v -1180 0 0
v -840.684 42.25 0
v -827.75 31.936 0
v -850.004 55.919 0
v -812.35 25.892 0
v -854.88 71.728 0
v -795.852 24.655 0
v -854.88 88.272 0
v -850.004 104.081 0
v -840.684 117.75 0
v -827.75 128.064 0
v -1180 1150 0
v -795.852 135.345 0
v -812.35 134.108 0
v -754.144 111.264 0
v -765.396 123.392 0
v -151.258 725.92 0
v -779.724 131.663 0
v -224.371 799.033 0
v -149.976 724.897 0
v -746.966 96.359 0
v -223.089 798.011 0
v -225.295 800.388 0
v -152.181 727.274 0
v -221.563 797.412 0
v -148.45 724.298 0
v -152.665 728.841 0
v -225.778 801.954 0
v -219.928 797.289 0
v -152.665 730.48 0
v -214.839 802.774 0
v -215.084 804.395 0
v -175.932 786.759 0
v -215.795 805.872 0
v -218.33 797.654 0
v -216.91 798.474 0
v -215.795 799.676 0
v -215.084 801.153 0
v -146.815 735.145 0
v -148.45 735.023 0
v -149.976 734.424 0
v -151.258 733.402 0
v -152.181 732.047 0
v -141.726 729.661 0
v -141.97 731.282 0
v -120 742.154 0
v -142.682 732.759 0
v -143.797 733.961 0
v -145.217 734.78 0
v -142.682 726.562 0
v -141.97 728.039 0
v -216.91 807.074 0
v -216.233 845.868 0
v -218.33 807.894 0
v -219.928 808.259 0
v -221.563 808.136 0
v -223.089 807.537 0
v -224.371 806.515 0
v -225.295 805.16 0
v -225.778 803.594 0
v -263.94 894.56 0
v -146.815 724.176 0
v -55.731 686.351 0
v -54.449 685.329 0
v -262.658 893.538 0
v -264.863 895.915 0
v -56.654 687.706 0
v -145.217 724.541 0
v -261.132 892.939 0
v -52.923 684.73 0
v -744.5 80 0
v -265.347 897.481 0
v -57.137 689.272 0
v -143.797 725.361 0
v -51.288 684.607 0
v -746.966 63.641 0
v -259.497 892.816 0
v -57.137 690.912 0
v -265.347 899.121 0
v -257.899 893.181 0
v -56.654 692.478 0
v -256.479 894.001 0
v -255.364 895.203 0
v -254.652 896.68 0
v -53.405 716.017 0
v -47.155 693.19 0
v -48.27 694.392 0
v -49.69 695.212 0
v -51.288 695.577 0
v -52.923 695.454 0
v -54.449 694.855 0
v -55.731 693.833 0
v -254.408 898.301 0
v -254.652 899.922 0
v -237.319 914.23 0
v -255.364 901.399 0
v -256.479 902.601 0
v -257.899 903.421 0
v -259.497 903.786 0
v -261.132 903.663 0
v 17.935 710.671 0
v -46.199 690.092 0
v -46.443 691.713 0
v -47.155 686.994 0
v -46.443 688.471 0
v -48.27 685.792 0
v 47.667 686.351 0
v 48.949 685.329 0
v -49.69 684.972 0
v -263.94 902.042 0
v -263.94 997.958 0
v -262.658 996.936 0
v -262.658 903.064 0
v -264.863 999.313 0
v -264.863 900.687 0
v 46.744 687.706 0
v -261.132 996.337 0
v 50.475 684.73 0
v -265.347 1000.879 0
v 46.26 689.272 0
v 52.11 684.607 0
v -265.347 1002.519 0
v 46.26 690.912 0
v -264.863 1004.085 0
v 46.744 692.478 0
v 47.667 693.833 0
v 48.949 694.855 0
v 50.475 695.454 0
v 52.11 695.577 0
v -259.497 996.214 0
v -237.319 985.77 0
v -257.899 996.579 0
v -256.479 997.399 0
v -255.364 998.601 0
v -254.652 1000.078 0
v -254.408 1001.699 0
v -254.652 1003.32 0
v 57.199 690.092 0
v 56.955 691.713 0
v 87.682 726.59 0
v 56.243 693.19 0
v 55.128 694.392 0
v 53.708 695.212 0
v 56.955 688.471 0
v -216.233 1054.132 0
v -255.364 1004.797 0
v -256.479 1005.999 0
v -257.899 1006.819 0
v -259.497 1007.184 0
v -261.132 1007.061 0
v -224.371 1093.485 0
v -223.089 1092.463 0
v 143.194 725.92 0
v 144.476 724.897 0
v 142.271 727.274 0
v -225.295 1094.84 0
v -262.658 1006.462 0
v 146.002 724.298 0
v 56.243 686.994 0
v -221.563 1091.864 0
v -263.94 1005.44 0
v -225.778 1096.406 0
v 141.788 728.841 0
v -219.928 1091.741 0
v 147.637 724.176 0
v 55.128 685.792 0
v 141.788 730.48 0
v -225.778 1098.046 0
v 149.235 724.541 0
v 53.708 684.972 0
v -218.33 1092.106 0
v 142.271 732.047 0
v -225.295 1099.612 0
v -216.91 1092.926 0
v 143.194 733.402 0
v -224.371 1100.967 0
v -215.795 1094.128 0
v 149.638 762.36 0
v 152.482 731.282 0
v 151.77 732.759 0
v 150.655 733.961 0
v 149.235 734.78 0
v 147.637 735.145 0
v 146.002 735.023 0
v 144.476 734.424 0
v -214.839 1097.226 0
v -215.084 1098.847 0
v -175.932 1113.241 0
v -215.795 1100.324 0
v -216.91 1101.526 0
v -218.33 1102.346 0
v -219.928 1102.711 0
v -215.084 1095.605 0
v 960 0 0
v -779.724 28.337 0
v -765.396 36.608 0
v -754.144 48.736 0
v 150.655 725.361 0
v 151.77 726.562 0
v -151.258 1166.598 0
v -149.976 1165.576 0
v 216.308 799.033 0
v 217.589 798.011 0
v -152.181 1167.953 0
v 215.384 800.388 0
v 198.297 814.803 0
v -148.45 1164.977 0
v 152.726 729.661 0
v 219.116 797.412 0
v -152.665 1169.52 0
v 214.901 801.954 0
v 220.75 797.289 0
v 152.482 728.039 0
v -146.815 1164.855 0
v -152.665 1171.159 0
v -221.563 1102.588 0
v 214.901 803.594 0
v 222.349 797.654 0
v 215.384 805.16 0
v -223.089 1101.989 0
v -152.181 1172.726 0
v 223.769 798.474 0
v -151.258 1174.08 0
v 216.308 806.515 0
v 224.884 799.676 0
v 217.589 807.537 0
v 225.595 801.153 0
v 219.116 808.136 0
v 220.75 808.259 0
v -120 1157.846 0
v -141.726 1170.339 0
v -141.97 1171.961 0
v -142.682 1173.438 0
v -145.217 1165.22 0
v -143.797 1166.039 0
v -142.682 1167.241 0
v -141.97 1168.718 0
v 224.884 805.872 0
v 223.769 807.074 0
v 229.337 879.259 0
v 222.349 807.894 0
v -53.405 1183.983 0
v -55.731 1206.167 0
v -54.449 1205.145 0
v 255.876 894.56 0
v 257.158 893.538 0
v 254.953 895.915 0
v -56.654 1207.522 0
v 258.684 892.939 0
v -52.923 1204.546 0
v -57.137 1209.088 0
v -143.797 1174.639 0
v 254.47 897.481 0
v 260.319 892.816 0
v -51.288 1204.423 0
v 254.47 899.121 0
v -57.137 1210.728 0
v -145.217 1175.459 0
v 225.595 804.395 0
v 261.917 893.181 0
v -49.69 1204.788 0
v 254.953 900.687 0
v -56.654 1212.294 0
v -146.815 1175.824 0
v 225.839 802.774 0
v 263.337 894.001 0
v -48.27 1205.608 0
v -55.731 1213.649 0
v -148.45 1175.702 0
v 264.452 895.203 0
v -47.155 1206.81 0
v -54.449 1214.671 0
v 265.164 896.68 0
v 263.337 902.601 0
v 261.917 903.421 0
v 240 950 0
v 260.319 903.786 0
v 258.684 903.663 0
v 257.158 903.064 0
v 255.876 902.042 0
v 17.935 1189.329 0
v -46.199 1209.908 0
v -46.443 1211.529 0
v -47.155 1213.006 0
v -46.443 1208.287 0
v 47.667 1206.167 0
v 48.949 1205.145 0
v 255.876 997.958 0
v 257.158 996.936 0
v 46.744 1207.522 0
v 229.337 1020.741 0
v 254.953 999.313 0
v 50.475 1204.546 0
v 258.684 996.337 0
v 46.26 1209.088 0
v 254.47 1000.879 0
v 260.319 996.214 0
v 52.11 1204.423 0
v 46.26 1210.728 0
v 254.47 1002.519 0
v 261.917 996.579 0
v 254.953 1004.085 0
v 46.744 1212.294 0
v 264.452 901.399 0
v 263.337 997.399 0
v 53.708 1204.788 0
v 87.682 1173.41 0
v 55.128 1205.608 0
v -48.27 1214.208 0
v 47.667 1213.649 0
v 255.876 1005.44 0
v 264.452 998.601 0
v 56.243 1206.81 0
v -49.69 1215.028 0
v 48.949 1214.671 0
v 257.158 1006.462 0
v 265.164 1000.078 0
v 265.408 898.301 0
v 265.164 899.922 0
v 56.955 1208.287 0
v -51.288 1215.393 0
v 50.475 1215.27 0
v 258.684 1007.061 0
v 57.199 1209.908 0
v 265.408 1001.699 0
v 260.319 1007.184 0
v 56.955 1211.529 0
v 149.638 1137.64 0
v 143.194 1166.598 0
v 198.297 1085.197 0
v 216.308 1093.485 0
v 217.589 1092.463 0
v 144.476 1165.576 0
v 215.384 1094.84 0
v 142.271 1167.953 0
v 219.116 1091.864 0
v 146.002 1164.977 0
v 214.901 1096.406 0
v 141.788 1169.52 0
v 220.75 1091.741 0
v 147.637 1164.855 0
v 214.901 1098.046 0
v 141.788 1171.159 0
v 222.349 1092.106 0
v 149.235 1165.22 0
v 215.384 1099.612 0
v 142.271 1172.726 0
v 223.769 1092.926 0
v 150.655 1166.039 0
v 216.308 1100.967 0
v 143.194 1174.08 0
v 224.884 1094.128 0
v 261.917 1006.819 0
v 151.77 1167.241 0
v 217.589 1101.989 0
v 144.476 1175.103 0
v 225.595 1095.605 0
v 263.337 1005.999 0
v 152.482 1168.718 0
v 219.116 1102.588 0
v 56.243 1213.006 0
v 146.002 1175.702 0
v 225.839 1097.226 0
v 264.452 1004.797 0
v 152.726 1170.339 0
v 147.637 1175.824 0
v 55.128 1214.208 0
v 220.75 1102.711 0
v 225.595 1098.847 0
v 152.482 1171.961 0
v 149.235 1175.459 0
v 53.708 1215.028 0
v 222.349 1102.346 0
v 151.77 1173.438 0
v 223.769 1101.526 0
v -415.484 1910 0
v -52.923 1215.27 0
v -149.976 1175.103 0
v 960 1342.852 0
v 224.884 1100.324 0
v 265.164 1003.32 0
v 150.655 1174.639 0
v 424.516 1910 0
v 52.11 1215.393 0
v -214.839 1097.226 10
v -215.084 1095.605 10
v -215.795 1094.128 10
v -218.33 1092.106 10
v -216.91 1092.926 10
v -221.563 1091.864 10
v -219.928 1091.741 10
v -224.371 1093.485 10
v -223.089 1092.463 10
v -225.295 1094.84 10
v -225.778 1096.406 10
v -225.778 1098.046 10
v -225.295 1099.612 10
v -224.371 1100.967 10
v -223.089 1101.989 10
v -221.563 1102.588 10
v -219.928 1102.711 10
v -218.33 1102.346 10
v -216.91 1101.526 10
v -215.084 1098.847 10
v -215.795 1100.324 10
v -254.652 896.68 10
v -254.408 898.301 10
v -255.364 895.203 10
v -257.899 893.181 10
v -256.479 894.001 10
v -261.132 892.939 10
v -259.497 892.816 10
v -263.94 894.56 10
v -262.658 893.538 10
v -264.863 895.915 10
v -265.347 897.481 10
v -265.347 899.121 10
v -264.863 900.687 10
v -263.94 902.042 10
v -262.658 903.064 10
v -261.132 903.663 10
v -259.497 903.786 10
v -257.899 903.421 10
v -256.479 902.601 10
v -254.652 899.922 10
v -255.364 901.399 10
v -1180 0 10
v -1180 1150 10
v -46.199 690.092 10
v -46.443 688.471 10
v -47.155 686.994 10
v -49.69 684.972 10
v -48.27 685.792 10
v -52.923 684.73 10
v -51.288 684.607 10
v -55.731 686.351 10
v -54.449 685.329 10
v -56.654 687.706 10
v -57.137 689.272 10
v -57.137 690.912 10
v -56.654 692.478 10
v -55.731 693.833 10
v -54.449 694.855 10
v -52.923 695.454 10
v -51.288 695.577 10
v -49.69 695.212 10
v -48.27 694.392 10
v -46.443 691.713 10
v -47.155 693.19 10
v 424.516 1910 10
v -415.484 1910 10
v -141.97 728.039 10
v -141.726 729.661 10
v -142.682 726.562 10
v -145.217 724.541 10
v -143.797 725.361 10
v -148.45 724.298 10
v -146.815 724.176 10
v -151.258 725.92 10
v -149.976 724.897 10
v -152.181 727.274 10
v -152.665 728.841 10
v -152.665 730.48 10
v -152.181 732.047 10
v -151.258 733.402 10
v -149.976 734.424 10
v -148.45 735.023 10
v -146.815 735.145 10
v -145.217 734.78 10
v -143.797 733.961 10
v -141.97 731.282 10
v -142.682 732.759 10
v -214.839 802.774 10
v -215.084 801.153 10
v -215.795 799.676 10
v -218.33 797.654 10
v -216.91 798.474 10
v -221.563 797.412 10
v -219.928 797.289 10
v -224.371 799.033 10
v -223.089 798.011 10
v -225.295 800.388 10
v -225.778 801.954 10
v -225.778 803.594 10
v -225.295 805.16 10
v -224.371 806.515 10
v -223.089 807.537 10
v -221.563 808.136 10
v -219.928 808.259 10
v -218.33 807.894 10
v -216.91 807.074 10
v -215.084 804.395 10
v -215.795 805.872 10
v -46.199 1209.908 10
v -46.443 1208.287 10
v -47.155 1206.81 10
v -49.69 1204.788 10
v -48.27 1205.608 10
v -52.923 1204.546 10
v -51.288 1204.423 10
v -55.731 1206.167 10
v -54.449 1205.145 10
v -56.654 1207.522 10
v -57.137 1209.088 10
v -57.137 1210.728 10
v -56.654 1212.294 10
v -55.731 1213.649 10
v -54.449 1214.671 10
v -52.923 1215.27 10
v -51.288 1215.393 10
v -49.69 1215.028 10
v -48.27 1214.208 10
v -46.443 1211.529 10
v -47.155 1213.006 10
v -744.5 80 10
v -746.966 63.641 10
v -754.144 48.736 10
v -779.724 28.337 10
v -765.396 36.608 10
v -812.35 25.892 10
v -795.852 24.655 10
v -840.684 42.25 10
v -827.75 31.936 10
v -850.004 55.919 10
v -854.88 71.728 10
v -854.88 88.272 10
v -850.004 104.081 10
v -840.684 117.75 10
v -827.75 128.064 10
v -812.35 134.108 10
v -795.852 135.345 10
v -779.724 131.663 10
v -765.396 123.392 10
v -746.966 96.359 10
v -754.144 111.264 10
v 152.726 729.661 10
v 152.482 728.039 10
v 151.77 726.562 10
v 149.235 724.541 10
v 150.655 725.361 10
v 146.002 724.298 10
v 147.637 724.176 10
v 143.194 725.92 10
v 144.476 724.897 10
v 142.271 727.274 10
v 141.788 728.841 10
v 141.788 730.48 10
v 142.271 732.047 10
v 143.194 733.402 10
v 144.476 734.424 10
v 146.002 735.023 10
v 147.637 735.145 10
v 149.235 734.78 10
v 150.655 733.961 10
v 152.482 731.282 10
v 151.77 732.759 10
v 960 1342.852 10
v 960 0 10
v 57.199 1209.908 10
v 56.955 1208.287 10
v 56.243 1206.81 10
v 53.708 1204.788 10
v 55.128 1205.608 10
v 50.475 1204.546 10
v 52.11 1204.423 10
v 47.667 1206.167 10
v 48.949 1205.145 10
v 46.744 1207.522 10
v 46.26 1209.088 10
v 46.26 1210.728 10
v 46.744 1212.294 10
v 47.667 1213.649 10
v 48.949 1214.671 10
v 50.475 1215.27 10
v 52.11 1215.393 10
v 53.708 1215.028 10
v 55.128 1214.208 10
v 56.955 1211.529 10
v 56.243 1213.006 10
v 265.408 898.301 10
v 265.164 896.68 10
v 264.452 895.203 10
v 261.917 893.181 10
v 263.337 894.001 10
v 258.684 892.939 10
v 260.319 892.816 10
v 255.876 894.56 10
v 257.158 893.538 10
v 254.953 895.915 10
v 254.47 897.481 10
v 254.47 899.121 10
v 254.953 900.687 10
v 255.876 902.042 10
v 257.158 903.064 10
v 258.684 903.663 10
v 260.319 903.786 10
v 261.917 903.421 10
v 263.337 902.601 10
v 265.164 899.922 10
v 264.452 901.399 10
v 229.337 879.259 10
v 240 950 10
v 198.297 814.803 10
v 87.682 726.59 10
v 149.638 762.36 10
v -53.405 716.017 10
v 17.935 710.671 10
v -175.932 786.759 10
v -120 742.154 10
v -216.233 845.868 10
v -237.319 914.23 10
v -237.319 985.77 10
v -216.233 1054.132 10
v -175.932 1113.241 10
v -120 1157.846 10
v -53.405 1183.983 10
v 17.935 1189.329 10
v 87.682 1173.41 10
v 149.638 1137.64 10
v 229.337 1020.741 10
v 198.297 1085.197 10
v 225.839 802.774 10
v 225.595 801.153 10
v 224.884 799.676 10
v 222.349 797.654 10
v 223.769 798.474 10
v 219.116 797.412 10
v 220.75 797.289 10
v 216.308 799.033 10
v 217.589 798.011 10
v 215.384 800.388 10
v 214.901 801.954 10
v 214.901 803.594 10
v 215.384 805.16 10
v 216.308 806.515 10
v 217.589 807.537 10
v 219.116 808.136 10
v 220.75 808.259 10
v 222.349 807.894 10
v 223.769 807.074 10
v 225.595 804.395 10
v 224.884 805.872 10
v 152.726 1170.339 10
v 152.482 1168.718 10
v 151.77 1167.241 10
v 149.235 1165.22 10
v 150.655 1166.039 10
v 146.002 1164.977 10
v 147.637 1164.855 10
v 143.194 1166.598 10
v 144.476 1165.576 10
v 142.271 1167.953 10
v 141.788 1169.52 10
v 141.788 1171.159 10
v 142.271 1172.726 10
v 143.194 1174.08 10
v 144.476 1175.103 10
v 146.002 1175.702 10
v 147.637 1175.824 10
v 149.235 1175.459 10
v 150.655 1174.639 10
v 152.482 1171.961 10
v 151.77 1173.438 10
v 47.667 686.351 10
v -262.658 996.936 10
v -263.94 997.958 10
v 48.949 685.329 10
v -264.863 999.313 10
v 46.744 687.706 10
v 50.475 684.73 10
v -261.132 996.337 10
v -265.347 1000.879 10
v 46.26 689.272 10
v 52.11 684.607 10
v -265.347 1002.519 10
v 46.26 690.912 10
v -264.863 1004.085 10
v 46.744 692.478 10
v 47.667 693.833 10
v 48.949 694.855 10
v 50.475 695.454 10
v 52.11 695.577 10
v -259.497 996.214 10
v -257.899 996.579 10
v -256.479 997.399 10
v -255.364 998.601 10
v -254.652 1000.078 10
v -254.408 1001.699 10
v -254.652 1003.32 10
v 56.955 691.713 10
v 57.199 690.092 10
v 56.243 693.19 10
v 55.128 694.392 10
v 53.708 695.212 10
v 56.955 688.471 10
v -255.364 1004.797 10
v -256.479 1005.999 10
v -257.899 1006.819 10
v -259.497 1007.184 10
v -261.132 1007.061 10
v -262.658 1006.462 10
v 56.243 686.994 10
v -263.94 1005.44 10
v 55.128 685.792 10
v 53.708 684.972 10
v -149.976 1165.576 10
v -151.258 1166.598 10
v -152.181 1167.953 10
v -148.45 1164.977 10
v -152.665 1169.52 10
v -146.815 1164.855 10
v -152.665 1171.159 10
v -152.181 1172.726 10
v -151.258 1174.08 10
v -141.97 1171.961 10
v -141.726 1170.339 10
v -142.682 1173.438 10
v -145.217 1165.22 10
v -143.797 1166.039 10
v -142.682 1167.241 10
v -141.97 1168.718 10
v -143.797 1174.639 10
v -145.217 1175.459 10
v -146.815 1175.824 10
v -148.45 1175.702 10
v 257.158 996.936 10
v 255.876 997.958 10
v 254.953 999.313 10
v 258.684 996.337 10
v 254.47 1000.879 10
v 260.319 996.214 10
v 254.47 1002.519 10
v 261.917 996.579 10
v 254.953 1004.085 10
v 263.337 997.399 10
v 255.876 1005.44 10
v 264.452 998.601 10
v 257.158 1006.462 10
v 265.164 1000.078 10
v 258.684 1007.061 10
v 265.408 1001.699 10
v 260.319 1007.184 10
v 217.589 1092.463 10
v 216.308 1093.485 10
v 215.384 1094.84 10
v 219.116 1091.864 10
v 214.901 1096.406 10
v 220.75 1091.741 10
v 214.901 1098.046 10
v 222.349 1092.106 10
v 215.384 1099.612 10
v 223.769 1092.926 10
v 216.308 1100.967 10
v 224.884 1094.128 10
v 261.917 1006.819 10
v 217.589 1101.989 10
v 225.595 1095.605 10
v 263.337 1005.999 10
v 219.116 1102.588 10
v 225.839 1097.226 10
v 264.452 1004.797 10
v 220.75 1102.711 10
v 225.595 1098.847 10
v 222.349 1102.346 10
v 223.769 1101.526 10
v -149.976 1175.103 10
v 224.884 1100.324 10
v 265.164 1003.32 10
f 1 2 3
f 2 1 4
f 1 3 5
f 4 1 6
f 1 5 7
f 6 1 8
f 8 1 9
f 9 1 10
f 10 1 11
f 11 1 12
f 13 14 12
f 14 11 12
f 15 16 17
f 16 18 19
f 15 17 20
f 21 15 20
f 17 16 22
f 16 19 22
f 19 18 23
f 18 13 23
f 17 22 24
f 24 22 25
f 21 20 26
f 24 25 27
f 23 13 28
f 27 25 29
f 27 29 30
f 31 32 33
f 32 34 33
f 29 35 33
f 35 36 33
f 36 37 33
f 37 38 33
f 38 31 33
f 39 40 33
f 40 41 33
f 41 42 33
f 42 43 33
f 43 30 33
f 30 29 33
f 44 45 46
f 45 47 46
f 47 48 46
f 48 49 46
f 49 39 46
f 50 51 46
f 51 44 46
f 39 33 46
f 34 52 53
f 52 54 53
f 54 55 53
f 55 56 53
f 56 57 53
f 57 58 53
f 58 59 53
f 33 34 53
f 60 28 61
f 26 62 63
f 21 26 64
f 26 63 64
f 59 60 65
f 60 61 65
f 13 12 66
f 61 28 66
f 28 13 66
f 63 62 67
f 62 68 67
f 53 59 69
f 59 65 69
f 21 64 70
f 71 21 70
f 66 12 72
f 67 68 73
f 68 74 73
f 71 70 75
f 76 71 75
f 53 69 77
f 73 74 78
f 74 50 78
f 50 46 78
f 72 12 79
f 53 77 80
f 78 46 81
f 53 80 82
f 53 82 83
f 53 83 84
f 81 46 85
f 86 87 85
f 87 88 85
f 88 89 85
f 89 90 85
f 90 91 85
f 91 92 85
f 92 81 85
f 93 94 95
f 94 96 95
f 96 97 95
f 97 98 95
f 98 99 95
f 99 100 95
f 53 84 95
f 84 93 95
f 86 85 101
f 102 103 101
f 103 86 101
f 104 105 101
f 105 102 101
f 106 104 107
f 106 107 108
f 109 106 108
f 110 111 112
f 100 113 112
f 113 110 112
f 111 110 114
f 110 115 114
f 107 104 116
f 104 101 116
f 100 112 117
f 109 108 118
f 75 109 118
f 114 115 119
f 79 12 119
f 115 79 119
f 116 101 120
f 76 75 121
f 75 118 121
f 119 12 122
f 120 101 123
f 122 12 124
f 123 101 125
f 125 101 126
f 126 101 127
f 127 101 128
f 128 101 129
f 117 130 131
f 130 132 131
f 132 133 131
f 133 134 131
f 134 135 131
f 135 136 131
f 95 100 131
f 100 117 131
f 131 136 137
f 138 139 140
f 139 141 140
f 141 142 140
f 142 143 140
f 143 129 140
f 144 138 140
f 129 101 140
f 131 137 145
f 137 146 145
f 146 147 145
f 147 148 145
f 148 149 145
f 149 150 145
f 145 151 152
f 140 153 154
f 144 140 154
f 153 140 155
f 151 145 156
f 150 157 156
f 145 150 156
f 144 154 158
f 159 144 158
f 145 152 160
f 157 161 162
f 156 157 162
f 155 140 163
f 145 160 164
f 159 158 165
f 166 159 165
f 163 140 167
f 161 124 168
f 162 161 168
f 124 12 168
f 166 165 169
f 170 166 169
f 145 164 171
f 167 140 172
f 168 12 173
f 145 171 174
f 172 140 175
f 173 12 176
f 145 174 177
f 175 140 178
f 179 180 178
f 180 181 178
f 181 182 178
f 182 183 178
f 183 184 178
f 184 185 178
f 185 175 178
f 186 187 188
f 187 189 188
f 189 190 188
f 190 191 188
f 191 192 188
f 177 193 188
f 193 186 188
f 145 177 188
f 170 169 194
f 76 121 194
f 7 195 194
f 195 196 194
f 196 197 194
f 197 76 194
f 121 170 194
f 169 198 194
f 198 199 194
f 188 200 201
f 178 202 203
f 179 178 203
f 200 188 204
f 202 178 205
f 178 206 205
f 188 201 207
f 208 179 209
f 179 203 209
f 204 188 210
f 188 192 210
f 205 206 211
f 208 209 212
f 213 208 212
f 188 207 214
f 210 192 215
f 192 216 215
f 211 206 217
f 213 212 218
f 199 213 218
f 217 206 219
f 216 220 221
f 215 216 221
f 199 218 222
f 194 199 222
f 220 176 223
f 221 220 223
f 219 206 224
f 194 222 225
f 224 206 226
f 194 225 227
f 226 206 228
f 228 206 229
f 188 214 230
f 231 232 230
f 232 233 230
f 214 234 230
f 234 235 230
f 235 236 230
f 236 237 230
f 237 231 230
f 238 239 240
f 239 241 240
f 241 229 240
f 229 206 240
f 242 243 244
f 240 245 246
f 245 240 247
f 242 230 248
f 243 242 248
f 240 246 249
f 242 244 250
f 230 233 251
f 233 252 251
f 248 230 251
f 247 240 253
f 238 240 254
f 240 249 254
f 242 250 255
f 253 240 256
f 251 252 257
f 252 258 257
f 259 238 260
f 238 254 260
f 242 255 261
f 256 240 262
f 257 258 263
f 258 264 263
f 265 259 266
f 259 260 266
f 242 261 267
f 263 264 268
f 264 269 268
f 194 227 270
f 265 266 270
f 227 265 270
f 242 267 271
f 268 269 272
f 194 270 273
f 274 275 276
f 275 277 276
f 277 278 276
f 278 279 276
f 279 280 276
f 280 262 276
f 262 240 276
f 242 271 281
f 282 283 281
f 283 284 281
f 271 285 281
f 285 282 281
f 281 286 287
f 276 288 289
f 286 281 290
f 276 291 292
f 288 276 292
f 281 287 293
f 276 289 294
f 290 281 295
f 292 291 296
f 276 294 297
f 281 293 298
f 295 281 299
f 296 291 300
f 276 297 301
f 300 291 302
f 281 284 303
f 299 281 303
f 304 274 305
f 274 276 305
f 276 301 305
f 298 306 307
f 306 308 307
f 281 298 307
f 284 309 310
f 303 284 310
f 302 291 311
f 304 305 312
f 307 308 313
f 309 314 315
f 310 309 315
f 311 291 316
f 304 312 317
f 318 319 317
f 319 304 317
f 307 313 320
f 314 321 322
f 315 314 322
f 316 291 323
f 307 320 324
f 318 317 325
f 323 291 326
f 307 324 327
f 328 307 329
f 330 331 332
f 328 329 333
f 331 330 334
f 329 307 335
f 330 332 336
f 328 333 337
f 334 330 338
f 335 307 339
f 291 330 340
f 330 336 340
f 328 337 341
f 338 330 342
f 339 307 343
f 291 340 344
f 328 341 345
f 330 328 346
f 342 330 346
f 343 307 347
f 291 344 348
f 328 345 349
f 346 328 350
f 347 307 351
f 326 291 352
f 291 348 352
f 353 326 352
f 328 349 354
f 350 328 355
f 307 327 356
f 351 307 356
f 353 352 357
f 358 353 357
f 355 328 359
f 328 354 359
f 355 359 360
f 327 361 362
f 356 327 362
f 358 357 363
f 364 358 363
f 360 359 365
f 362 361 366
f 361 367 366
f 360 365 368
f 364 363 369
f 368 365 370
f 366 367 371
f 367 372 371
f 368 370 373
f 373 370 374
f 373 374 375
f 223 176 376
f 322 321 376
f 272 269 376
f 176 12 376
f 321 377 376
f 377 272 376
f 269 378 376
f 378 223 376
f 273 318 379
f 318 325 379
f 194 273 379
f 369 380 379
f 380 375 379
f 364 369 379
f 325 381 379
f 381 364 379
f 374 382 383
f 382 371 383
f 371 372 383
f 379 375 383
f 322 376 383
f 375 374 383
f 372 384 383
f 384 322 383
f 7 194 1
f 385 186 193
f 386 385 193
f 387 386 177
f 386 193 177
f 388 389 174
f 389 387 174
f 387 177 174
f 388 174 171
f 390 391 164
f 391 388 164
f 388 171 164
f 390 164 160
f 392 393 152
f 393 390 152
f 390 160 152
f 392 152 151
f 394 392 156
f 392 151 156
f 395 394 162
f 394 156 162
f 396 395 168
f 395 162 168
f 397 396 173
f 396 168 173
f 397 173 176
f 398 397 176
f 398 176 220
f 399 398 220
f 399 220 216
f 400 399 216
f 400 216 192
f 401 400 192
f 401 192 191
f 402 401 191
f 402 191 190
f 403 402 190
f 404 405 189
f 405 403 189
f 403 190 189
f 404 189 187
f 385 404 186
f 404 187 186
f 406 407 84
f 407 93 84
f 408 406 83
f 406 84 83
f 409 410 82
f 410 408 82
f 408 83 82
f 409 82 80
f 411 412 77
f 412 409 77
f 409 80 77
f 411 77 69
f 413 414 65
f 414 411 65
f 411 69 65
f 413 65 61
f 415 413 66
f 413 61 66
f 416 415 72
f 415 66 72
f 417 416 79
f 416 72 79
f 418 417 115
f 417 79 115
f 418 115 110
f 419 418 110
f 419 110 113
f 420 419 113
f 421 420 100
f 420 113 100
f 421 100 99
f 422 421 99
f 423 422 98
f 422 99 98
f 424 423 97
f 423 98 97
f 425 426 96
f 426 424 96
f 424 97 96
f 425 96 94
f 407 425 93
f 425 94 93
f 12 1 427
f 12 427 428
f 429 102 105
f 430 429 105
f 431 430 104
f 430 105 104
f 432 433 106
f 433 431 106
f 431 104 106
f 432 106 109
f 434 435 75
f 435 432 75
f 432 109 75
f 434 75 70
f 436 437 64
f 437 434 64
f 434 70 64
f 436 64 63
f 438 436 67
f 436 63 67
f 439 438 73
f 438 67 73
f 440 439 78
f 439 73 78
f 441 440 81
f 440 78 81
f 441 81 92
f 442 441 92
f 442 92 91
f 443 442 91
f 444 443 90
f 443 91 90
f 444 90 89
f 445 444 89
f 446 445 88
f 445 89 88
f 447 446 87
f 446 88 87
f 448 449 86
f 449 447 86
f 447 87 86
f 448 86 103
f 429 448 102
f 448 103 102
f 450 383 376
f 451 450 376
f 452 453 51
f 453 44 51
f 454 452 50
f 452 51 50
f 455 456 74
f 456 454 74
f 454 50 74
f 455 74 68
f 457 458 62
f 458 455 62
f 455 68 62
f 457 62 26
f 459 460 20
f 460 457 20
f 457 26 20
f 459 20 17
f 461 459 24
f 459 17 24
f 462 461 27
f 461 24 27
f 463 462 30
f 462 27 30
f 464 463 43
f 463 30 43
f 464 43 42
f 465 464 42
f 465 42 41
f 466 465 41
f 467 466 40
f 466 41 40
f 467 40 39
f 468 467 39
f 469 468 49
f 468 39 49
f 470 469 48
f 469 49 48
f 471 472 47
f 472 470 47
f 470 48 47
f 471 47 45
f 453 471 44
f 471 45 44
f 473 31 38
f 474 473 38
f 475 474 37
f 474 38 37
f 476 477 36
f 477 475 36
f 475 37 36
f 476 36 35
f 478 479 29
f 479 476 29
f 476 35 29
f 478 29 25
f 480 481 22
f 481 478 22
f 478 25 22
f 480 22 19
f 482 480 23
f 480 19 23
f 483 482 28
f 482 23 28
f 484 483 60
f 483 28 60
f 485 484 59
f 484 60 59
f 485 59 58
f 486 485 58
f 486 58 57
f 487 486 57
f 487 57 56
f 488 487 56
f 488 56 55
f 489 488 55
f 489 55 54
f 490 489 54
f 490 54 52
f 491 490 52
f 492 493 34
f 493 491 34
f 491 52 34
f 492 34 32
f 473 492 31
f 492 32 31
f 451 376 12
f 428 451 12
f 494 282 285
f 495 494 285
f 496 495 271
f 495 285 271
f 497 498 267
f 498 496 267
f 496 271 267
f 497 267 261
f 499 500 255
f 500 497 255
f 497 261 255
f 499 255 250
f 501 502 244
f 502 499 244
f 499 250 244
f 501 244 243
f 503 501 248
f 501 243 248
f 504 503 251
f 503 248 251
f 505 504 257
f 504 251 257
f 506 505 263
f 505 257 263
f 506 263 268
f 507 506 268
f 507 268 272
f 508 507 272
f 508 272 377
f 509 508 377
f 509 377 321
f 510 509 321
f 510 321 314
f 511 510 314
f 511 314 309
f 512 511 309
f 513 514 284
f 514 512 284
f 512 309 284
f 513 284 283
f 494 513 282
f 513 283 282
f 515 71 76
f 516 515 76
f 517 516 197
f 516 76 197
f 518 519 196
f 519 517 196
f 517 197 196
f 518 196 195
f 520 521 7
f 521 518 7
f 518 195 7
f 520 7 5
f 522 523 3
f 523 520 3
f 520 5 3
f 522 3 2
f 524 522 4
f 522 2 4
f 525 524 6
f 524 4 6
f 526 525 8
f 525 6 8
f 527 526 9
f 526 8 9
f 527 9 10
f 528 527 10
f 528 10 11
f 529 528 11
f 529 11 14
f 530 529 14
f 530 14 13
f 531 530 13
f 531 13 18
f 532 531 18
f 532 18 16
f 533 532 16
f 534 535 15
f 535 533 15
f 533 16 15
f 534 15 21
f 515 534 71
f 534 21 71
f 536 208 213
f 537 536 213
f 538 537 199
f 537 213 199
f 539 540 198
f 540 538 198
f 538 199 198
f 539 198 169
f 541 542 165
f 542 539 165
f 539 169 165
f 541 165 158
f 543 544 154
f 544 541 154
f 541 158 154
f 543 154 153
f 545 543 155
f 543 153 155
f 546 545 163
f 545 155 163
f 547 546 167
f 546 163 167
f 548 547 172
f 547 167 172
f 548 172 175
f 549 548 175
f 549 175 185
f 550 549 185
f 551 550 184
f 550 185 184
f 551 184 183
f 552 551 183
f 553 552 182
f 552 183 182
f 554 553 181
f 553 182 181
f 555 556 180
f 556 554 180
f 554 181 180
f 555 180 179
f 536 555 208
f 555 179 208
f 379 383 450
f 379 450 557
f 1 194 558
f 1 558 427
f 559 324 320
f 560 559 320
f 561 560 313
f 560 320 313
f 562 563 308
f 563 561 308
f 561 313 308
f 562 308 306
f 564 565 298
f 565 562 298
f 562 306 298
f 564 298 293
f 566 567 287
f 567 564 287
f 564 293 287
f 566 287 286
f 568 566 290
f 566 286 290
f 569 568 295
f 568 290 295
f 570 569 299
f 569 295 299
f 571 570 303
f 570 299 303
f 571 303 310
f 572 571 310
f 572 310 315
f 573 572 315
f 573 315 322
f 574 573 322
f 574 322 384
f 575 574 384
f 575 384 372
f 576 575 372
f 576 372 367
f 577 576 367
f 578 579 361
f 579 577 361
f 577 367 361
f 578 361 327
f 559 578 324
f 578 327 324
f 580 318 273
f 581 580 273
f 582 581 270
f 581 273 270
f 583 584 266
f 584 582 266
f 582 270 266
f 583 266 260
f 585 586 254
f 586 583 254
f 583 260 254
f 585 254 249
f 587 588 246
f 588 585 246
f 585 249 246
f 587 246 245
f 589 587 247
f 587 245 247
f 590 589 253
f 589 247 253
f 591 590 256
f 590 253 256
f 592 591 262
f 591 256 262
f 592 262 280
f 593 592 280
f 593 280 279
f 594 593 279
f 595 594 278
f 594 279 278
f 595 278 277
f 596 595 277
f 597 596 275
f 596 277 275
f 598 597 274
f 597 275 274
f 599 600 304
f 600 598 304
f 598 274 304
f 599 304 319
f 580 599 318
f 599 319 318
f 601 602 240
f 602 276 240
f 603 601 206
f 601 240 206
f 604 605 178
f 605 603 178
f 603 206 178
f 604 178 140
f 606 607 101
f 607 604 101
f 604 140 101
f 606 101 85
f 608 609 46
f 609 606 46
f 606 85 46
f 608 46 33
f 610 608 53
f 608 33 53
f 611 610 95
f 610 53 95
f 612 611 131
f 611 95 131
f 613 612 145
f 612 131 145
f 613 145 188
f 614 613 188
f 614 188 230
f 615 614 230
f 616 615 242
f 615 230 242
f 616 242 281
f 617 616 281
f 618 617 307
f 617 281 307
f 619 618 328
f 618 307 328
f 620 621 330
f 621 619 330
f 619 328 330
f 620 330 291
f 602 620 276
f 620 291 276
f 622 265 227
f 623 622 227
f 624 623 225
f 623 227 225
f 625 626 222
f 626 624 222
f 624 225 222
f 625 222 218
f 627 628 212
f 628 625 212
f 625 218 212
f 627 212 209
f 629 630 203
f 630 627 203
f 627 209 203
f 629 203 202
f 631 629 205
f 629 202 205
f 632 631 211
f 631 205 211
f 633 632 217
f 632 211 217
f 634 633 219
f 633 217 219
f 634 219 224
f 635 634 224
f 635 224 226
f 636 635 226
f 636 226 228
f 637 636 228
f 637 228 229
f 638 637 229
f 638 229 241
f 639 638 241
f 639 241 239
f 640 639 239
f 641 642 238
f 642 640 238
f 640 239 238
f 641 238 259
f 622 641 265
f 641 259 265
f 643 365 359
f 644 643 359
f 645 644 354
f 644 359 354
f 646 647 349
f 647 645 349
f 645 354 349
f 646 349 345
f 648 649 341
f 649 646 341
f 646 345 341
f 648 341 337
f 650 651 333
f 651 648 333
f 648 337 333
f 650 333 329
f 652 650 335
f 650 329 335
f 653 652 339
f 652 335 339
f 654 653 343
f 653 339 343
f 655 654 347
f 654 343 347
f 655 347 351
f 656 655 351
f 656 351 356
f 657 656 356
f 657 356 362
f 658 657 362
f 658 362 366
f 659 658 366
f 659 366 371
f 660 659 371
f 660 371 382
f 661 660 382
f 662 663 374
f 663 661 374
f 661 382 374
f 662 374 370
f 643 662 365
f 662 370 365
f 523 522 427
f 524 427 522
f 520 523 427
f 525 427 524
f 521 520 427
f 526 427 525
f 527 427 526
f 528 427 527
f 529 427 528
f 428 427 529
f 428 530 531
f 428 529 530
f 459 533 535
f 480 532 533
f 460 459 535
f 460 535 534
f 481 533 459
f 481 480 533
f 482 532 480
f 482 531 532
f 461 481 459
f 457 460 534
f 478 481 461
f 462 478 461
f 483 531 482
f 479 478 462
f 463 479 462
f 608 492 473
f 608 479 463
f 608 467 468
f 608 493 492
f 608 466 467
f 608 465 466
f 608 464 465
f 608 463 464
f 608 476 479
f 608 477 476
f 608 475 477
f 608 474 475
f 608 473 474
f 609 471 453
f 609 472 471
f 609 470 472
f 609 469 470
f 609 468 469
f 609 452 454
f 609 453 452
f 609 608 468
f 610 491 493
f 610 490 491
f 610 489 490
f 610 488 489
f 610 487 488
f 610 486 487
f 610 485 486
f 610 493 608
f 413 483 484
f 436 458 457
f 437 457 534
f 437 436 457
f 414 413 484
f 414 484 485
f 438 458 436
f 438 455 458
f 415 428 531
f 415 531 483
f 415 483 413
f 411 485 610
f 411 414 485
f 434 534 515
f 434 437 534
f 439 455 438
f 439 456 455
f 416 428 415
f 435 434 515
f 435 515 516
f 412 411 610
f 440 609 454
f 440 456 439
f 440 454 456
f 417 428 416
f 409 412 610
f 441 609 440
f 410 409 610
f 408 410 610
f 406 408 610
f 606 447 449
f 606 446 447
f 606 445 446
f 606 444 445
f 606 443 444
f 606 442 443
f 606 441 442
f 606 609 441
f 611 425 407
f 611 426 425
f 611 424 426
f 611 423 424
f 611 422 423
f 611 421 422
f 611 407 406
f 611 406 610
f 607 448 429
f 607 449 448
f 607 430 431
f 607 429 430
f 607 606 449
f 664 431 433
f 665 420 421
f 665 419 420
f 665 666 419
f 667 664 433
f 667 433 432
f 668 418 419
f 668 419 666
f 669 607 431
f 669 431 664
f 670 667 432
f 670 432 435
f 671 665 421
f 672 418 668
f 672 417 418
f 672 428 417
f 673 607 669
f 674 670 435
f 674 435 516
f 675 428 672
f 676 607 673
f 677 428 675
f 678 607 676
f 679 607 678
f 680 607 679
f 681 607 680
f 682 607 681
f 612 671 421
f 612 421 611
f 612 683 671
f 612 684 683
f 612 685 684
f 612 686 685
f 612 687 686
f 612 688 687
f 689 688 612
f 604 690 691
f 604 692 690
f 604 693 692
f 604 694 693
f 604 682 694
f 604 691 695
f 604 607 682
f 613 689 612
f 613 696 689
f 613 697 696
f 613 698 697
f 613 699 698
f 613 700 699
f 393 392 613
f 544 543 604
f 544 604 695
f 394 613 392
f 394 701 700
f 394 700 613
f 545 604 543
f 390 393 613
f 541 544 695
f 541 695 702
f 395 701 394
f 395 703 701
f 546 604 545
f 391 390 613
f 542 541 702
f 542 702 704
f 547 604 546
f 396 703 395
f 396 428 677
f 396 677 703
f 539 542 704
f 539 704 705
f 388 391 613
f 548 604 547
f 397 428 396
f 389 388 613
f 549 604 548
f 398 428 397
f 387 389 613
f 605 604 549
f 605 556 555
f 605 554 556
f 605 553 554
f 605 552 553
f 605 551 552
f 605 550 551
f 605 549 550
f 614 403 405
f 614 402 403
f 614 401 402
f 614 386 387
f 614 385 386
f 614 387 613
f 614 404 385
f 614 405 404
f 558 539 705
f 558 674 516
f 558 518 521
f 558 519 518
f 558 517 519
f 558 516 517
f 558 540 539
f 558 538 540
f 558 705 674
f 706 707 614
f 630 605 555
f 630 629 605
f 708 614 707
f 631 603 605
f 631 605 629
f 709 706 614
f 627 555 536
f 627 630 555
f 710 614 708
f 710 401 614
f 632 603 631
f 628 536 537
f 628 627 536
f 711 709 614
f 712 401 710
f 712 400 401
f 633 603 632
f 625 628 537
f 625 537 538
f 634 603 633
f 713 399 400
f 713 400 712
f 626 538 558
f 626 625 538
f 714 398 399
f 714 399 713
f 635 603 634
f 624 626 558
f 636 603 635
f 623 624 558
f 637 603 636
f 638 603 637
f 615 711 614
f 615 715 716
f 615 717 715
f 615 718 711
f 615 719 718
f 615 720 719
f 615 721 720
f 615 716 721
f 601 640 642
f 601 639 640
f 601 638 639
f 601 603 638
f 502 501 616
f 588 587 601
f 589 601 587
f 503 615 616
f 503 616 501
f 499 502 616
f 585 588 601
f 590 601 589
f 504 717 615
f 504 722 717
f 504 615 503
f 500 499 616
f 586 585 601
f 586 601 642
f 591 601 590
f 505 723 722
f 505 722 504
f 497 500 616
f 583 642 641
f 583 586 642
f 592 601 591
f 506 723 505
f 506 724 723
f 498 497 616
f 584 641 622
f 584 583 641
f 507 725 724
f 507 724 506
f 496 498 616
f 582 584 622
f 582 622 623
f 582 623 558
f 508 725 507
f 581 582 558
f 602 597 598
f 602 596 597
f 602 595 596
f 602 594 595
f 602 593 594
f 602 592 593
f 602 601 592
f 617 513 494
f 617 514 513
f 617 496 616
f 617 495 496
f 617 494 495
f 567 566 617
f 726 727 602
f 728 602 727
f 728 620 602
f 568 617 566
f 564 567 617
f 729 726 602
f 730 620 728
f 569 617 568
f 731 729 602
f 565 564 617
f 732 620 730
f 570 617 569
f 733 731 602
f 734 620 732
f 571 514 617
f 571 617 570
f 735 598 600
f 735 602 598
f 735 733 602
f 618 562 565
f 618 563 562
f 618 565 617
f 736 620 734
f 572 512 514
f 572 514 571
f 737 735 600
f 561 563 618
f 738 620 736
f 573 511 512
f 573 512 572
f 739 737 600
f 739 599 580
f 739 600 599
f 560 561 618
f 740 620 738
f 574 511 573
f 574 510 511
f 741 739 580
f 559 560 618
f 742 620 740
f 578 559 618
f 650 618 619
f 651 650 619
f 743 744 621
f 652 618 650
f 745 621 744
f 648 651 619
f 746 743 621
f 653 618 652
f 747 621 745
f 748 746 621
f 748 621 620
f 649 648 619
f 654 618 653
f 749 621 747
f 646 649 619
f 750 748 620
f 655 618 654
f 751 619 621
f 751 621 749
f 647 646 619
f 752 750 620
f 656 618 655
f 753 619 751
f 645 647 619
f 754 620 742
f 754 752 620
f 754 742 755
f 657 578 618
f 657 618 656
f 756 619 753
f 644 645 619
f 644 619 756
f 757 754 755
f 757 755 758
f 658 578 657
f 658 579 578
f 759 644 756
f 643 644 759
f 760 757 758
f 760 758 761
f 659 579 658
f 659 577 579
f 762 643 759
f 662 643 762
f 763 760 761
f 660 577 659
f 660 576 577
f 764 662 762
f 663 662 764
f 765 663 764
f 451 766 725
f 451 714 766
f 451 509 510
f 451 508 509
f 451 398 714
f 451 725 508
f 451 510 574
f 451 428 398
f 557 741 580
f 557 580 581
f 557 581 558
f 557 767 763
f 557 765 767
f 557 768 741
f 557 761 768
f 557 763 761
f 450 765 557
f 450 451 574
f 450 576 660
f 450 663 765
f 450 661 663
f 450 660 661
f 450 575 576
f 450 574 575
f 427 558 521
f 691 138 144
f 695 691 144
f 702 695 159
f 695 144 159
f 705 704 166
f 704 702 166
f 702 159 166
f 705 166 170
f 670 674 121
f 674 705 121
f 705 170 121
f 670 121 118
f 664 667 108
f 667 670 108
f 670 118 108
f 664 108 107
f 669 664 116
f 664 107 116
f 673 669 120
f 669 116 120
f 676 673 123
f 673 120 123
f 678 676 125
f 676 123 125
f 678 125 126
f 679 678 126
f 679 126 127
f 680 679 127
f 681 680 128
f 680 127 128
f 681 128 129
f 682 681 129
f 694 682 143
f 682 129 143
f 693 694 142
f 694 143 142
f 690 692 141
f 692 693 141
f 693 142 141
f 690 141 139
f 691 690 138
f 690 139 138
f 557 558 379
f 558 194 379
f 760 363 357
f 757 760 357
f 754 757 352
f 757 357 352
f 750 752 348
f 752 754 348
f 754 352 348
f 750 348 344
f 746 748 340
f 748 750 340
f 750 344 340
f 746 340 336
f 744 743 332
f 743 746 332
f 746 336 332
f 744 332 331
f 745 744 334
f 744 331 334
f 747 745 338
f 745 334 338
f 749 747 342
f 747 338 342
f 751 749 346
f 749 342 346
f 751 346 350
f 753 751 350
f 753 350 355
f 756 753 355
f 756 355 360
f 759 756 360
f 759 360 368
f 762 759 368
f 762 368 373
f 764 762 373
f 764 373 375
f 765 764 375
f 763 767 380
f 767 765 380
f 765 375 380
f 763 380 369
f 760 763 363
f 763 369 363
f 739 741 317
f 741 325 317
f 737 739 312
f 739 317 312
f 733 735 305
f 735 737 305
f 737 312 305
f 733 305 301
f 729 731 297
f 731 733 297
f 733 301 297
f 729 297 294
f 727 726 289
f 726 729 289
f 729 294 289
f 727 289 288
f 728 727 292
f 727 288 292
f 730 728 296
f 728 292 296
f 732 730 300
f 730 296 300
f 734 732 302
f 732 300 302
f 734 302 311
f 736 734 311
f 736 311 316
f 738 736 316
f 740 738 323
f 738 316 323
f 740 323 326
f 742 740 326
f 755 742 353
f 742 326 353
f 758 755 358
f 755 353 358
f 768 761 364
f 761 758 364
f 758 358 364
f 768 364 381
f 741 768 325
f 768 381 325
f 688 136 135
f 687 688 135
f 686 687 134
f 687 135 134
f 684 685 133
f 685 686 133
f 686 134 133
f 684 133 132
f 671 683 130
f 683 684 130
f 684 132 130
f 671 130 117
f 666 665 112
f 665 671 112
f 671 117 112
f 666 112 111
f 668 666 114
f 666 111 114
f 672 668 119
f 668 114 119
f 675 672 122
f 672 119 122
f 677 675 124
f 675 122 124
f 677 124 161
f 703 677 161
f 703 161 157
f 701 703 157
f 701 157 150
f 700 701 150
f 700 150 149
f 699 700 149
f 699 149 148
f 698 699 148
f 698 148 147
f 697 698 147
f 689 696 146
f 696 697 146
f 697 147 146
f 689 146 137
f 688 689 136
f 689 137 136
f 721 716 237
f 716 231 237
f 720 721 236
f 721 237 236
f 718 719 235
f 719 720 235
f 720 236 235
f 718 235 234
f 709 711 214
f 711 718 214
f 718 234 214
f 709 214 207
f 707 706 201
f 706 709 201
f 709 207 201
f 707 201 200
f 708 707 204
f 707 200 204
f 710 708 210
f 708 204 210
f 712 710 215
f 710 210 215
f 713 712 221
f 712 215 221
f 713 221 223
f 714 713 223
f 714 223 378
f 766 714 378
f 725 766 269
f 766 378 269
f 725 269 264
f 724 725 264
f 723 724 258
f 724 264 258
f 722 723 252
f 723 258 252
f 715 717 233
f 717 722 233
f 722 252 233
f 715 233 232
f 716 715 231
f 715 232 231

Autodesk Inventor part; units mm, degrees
ref_plane "YZ Plane" through (0, 0, 0) normal (1, 0, 0) x (0, 1, 0)
ref_plane "XZ Plane" through (0, 0, 0) normal (0, 1, 0) x (-1, 0, 0)
ref_plane "XY Plane" through (0, 0, 0) normal (0, 0, 1) x (1, 0, 0)
sketch "Sketch1" plane through (0, 0, 0) normal (0, 0, 1) x (1, 0, 0)
  line L0 (0, 0) -> (0, 1910) construction
  line L1 (424.5155, 1910) -> (-415.4845, 1910)
  line L2 (-415.4845, 1910) -> (-1180, 1150)
  line L3 (-1180, 0) -> (-1180, 1150)
  line L4 (960, 0) -> (960, 1342.8524)
  line L5 (424.5155, 1910) -> (960, 1342.8524)
  circle A0 centre (0, 950) radius 265 construction
  line L6 (960, 0) -> (-1180, 0)
  circle A1 centre (-1701.6377, -269.2167) radius 188.5 construction
  circle A2 centre (-800, 80) radius 55.5
  circle A3 centre (0, 950) radius 240
  line L7 (0, 1215) -> (0, 1190) construction
  circle A4 centre (51.6989, 1209.9081) radius 5.5
  line L8 (0, 950) -> (51.6989, 1209.9081) construction
  circle A5 centre (-51.6989, 1209.9081) radius 5.5
  circle A6 centre (-147.2261, 1170.3394) radius 5.5
  circle A7 centre (-220.3394, 1097.2261) radius 5.5
  circle A8 centre (-259.9081, 1001.6989) radius 5.5
  circle A9 centre (-259.9081, 898.3011) radius 5.5
  circle A10 centre (-220.3394, 802.7739) radius 5.5
  circle A11 centre (-147.2261, 729.6606) radius 5.5
  circle A12 centre (-51.6989, 690.0919) radius 5.5
  circle A13 centre (51.6989, 690.0919) radius 5.5
  circle A14 centre (147.2261, 729.6606) radius 5.5
  circle A15 centre (220.3394, 802.7739) radius 5.5
  circle A16 centre (259.9081, 898.3011) radius 5.5
  circle A17 centre (259.9081, 1001.6989) radius 5.5
  circle A18 centre (220.3394, 1097.2261) radius 5.5
  circle A19 centre (147.2261, 1170.3394) radius 5.5
  dimension "d72" = 480
  dimension "d1" = 840
  dimension "d3" = 1150
  dimension "d12" = 1180
  dimension "d13" = 950
  dimension "d14" = 111
  dimension "d15" = 1910
  dimension "d17" = -521.6377
  dimension "d18" = 377
  dimension "d19" = -269.2167
  dimension "d34" = 380
  dimension "d35" = 80
  dimension "d37" = 2140
  dimension "d52" = 530
  dimension "d69" = 780
  dimension "d71" = 1078
  dimension "d74" = 11
  dimension "d79" = 11.25
  dimension "d82" = 360
extrude "Extrusion1" add sketch "Sketch1" along normal blind 10
fillet "Fillet1" [suppressed]
sketch "Sketch4" plane through (0, 0, 0) normal (0, 0, 1) x (1, 0, 0)
  circle A0 centre (-51.6989, 1209.9081) radius 6.5
  circle A1 centre (0, 950) radius 240 projected
  line L0 (0, 950) -> (0, 1196.7062) construction
  line L1 (-51.6989, 1209.9081) -> (0, 950) construction
  point P0 (0, 0)
  point P1 (240, 950)
  point P2 (-5, 1149.9375)
  point P3 (-2.5, 1189.987)
  point P4 (-168.8194, 970)
  point P5 (-2.5, 710.013)
  dimension "d59" = 265
  dimension "d60" = 13
  dimension "d61" = 11.25
extrude "Extrusion4" [suppressed]
pattern_circular "Circular Pattern3" [suppressed]
properties part number "Wall right v2.0"
